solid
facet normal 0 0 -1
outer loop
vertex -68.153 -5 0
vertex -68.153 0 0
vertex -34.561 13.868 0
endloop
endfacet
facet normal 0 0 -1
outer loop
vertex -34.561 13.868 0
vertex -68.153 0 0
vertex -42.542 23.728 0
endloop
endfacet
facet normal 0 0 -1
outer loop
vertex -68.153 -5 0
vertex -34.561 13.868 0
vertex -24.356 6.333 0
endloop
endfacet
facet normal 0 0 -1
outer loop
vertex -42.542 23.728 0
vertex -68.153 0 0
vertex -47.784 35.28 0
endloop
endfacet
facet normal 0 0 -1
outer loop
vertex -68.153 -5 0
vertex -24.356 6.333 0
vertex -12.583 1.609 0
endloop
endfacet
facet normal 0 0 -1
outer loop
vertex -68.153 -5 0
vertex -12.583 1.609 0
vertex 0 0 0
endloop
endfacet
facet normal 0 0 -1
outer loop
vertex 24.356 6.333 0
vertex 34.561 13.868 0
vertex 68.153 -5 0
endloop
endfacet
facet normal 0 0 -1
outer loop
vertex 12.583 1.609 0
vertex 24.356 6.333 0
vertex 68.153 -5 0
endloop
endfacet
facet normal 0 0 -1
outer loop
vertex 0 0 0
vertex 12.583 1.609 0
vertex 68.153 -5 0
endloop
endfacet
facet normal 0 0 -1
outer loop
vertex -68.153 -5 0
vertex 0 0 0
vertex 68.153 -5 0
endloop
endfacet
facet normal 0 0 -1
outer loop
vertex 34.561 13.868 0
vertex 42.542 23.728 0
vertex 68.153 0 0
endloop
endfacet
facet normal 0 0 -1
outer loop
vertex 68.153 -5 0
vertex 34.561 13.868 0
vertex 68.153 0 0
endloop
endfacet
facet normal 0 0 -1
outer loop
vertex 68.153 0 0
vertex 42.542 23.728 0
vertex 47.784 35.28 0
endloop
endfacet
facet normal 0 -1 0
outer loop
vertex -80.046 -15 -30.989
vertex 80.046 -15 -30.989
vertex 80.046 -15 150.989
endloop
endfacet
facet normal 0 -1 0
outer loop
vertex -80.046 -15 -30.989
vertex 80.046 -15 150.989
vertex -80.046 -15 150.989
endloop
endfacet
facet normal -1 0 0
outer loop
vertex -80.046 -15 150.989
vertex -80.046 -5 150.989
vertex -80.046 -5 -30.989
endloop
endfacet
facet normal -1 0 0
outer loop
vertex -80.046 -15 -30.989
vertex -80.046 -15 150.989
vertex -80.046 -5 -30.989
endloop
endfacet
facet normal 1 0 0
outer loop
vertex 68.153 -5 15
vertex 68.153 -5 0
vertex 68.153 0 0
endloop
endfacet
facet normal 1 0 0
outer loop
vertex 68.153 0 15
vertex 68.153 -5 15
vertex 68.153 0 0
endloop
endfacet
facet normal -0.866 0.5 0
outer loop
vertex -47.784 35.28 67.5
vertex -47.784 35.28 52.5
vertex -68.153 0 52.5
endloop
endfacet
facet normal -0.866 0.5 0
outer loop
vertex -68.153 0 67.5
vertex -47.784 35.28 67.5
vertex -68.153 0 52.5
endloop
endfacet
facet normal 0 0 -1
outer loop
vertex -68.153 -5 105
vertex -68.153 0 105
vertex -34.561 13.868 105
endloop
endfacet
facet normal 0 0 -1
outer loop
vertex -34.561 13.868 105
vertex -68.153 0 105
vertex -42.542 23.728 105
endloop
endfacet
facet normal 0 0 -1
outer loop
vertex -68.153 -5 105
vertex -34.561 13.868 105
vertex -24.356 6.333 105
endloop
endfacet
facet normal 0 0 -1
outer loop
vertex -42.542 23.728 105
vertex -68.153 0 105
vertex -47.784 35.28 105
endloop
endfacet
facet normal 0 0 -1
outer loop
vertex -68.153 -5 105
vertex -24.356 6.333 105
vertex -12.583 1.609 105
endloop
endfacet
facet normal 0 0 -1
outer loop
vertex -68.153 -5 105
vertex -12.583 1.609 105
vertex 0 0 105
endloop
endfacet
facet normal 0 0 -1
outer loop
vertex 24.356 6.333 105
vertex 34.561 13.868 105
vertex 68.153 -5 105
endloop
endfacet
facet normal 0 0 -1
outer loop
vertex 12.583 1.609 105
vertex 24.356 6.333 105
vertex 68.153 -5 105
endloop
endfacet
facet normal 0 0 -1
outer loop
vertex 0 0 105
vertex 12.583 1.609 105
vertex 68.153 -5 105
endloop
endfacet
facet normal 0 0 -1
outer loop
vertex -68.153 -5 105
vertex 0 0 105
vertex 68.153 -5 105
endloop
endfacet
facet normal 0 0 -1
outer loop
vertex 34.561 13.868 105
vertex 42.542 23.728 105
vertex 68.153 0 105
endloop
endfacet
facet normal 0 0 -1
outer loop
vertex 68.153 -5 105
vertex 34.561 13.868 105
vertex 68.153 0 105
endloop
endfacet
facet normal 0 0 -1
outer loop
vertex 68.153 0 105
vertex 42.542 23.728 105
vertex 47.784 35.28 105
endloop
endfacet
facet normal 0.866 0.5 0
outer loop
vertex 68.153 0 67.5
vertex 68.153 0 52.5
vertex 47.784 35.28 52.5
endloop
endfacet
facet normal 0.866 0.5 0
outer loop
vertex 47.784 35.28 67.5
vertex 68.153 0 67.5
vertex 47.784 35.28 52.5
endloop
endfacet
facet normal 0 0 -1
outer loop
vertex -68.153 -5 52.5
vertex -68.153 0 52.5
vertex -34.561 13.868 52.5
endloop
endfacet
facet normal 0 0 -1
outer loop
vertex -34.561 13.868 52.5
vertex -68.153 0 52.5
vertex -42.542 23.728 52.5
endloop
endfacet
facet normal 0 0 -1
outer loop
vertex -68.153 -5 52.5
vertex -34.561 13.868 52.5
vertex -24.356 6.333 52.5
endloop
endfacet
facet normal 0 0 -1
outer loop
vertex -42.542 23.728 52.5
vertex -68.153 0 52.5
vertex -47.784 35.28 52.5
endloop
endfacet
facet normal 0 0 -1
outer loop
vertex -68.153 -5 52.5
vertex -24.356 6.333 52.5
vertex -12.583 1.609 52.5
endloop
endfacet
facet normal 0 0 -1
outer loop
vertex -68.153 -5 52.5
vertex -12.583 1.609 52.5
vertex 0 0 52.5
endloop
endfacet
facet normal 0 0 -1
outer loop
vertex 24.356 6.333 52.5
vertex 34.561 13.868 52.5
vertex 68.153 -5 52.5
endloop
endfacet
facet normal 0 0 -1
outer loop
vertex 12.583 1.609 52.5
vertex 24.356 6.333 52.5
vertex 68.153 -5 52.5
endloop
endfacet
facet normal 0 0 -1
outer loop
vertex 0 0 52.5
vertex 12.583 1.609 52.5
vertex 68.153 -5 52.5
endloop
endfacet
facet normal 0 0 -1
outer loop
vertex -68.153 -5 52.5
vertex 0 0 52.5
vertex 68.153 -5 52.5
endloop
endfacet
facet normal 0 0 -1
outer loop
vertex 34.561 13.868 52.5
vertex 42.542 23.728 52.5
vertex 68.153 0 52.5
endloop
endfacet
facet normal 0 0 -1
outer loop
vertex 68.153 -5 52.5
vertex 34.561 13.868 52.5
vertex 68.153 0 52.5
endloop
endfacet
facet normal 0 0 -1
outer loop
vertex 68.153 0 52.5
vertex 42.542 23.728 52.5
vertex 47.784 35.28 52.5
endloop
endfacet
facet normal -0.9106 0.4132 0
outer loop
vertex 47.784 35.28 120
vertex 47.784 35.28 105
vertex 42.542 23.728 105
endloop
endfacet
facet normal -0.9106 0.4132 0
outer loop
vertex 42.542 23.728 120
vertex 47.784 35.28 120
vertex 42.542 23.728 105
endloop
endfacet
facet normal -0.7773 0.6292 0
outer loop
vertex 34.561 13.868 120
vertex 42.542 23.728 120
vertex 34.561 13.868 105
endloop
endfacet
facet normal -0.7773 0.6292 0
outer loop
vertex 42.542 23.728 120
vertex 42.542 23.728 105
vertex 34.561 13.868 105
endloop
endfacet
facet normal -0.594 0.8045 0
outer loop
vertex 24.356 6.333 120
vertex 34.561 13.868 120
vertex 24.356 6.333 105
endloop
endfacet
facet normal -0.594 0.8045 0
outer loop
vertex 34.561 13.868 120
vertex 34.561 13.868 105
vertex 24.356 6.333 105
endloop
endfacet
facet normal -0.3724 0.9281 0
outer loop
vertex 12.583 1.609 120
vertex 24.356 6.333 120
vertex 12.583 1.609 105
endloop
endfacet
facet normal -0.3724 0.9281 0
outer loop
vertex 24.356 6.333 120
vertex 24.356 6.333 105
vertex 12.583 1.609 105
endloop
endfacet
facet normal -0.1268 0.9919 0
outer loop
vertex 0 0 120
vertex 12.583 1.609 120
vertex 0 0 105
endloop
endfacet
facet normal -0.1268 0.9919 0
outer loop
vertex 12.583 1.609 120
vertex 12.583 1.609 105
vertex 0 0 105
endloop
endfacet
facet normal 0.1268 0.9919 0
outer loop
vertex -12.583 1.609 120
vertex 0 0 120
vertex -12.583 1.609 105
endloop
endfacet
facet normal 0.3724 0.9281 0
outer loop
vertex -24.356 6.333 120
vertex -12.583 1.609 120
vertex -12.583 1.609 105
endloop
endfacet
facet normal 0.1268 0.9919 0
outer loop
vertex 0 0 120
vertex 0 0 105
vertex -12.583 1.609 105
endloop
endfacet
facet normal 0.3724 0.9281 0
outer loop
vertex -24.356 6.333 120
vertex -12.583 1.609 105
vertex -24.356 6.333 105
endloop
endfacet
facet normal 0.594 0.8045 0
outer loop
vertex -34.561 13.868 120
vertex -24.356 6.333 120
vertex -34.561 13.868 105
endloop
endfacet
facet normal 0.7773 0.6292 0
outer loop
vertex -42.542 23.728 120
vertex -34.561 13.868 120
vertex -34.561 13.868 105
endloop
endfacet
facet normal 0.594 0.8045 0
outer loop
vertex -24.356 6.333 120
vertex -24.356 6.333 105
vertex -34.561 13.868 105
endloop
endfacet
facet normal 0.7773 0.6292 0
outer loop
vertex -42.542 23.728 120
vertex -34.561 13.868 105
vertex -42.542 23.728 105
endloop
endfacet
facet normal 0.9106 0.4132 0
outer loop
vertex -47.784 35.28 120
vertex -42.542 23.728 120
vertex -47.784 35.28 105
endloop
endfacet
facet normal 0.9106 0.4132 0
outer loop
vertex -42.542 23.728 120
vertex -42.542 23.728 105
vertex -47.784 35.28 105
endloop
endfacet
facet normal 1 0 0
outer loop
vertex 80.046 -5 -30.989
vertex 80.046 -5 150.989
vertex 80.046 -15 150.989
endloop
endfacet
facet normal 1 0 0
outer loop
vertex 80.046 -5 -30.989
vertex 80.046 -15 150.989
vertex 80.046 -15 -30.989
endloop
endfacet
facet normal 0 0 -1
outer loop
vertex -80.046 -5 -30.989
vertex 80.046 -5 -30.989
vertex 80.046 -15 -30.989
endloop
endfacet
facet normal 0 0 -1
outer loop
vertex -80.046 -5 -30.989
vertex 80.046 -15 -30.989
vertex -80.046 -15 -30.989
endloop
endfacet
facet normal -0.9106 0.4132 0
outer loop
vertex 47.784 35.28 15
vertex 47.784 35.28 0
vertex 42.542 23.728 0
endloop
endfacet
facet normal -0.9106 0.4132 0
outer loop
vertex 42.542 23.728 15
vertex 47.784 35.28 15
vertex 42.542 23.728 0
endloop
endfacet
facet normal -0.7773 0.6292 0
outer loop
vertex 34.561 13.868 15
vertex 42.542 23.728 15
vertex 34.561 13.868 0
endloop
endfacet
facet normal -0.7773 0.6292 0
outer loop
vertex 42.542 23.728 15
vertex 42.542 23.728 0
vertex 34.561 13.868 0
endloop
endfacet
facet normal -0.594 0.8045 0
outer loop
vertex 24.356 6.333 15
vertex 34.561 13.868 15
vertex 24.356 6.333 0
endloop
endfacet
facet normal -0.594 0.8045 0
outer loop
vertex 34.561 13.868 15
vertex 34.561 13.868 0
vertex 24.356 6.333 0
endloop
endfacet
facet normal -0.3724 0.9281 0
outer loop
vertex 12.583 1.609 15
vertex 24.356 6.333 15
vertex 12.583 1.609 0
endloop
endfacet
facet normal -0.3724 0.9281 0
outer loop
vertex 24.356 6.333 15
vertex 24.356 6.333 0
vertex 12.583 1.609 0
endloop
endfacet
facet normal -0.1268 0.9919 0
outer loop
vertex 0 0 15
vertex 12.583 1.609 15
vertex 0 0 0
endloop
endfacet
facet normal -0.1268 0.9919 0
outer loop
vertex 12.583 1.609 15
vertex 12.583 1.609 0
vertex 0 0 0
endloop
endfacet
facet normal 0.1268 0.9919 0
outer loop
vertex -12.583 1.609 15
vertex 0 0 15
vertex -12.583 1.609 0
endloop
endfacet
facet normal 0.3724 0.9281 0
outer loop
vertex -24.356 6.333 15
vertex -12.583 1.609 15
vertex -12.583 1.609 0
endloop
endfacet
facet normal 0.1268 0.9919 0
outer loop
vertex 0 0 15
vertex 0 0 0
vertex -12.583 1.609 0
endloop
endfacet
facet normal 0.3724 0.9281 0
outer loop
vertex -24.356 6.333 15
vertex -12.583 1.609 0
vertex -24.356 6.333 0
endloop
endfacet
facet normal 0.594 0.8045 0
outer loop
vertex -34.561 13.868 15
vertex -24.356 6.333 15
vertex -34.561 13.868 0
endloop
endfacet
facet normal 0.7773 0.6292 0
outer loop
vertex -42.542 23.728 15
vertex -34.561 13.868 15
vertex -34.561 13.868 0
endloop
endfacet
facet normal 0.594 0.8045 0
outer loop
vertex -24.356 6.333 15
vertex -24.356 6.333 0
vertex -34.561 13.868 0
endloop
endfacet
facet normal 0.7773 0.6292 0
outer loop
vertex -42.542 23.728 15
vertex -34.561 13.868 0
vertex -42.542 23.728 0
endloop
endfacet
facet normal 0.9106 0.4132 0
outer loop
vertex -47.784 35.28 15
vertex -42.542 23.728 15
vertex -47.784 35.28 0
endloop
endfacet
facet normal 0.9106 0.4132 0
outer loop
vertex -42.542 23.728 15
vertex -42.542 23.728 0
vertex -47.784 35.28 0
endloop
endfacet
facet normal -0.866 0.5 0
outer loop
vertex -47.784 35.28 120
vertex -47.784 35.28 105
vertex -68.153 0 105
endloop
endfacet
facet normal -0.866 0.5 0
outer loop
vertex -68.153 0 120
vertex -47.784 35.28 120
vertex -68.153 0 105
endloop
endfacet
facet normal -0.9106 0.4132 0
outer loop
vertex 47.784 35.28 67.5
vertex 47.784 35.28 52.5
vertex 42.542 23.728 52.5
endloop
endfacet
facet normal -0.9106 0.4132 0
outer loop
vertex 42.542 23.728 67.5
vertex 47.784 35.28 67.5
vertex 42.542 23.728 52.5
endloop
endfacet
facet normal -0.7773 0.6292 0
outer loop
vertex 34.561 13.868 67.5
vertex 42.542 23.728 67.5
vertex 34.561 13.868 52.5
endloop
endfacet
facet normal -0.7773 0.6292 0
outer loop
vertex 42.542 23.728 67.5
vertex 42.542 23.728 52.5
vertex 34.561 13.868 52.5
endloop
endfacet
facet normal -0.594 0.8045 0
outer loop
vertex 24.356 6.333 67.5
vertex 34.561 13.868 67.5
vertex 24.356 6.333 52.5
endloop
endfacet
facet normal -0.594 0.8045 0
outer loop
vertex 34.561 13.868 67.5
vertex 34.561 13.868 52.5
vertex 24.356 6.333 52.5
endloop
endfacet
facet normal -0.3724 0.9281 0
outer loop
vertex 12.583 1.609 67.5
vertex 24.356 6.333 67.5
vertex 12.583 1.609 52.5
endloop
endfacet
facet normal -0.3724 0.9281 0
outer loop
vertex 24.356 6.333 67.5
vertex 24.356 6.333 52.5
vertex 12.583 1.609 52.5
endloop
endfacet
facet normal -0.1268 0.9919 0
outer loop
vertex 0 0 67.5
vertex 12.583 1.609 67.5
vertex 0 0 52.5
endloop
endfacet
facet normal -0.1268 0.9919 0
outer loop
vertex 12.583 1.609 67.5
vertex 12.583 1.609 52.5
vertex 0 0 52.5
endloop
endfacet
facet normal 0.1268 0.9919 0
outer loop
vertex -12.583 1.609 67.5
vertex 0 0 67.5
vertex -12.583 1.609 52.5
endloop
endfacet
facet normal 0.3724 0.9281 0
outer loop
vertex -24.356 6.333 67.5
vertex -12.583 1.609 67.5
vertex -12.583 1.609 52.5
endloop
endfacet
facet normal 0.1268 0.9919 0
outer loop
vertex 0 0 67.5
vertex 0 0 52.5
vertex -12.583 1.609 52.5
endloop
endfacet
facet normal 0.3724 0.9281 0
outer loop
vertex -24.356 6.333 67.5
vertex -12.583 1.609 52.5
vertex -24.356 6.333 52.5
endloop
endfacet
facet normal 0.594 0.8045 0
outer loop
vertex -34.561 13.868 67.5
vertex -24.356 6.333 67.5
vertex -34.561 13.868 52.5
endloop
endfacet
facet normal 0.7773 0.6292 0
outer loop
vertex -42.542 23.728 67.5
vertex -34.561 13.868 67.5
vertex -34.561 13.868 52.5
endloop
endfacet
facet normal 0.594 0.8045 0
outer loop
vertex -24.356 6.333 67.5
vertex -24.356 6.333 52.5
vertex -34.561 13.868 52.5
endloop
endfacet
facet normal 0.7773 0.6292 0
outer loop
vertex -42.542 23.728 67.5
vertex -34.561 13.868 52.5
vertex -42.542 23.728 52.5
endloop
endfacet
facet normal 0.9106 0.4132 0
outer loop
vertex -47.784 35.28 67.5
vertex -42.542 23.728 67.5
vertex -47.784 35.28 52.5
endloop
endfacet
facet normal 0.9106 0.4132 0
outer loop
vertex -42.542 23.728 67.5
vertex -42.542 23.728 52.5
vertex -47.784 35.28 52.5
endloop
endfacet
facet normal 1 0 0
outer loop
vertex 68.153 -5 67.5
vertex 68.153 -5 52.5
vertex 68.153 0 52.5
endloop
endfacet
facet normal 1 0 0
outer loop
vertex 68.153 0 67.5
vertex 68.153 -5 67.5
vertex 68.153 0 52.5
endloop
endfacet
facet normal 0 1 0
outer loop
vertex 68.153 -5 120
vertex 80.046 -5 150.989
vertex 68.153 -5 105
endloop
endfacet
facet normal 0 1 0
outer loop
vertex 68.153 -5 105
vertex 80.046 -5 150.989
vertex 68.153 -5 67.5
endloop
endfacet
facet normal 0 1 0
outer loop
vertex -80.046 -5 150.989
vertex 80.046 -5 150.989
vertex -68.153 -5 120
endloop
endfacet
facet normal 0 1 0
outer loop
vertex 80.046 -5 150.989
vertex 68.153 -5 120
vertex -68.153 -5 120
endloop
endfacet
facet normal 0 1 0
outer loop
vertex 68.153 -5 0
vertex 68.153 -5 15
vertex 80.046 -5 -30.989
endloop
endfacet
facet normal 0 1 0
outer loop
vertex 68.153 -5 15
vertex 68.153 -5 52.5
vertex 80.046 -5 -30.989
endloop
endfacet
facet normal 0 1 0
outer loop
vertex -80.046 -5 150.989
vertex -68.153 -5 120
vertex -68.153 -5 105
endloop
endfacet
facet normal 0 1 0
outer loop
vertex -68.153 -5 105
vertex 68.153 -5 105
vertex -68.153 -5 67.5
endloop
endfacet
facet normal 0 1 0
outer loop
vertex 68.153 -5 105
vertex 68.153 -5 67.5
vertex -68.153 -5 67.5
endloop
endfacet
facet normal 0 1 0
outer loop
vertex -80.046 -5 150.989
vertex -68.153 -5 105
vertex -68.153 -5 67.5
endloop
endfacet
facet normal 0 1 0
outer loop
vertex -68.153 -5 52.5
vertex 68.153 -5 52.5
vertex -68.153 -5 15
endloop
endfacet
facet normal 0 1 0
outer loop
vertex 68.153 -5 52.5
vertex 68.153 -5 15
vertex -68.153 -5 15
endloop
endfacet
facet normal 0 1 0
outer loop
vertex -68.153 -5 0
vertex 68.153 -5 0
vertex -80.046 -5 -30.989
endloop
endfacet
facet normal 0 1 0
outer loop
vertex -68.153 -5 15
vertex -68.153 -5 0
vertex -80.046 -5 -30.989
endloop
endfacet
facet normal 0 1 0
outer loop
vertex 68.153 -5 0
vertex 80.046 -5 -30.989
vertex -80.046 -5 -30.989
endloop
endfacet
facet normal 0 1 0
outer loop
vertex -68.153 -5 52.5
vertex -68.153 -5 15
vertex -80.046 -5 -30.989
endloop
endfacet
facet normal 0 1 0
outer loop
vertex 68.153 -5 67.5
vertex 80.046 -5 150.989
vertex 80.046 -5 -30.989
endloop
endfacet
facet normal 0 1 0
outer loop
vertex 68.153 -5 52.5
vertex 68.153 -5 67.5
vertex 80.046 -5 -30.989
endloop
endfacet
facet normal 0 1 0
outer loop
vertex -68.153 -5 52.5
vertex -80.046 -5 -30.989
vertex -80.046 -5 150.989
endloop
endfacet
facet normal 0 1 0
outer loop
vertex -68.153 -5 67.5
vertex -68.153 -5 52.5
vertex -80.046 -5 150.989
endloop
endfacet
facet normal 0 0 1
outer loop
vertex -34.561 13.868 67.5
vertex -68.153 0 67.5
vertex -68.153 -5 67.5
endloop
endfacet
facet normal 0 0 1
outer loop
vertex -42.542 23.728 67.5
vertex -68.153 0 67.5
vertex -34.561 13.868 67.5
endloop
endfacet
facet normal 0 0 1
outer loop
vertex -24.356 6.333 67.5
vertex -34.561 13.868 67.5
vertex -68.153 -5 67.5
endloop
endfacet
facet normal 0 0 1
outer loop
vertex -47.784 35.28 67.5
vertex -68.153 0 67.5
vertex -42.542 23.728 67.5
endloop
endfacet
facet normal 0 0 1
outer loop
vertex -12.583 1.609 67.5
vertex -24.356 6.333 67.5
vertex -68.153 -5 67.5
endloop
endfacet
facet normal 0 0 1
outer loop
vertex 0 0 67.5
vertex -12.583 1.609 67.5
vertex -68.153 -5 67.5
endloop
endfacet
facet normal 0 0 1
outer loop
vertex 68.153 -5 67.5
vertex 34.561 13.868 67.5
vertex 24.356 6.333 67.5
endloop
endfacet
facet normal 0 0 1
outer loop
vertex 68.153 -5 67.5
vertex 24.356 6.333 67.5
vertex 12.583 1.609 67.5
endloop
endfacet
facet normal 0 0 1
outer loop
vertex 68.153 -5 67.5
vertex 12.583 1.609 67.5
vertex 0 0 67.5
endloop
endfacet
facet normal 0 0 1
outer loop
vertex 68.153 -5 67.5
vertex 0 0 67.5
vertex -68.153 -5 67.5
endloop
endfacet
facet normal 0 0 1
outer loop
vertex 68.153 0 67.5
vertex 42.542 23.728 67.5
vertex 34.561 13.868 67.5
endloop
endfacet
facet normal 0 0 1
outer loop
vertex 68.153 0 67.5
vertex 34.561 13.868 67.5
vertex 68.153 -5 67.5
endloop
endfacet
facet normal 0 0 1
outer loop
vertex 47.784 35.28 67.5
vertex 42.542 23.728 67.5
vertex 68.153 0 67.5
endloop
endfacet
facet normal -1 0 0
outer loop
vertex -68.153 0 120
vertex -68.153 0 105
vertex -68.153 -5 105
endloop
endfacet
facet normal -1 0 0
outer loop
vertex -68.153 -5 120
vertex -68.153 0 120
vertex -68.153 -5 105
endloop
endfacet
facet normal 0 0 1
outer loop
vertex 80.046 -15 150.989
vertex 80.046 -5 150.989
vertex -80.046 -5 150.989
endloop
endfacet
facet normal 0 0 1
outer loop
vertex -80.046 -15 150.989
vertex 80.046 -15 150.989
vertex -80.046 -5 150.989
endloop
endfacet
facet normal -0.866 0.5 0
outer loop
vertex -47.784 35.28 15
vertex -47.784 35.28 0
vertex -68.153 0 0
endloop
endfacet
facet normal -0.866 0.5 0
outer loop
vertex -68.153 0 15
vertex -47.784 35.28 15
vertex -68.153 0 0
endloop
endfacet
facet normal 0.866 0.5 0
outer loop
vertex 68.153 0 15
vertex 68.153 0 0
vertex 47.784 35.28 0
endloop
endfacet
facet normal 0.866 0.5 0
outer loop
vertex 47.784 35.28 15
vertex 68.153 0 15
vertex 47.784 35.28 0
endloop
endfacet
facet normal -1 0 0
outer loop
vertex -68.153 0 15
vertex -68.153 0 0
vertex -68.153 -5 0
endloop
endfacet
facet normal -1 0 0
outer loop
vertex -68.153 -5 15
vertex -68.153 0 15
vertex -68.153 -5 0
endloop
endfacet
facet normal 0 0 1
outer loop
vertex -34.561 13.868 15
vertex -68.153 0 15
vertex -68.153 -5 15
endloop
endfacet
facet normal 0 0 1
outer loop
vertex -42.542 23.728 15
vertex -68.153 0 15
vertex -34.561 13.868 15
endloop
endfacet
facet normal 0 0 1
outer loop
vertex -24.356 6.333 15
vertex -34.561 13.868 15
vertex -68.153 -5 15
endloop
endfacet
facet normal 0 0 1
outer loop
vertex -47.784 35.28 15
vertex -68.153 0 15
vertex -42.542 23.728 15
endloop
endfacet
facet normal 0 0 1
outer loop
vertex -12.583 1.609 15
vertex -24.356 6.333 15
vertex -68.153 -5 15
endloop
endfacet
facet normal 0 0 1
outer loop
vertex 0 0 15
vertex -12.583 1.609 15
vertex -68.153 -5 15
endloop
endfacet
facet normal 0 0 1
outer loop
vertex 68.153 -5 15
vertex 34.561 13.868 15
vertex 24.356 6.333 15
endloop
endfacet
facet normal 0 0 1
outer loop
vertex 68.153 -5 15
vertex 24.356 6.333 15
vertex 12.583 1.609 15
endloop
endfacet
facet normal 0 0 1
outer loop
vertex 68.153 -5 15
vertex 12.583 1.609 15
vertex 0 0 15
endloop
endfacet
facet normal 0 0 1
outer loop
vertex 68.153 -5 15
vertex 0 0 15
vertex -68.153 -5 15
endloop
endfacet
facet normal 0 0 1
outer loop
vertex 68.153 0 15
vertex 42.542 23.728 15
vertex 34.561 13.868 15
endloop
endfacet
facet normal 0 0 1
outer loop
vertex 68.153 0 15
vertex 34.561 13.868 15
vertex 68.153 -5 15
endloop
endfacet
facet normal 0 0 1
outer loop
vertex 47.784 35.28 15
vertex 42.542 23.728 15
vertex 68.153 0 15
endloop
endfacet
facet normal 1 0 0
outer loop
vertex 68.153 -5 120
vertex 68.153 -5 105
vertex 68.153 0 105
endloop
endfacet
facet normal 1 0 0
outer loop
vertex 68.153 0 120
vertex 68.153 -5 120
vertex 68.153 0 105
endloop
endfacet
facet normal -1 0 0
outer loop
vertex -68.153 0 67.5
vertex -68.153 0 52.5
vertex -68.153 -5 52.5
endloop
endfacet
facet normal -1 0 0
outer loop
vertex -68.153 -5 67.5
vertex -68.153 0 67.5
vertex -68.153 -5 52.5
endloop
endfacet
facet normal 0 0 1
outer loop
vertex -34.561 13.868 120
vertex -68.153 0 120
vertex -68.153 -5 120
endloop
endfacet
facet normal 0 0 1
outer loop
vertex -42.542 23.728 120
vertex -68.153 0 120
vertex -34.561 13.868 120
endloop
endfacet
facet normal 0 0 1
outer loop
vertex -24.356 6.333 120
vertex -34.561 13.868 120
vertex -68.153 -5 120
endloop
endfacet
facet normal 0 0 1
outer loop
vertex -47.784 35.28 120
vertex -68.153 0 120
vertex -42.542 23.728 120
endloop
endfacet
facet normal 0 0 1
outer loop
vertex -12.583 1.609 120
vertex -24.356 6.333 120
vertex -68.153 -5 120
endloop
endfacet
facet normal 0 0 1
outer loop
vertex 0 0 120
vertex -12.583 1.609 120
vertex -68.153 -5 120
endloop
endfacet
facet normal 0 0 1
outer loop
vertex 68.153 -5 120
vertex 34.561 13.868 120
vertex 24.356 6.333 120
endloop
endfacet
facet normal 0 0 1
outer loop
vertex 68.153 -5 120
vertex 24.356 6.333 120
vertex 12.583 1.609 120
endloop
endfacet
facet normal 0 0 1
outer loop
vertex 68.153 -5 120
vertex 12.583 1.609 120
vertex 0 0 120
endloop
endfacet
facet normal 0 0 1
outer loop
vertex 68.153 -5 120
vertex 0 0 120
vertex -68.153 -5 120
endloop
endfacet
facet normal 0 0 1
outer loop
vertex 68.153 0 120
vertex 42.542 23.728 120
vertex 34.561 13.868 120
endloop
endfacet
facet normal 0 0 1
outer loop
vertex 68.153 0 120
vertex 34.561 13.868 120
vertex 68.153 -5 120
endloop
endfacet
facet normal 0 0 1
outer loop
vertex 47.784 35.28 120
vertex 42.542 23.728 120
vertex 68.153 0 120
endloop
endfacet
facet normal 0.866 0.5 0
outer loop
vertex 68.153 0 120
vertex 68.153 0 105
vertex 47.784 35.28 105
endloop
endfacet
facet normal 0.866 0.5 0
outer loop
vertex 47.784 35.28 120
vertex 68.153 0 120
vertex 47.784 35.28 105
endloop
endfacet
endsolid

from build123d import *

# Parameters (mm, degrees)
EXTRUDE_1_DEPTH        = 15
PATTERN_LINEAR_1_COUNT = 3
PATTERN_LINEAR_1_PITCH = 52.5
SKETCH_2_W             = 160.09172752
SKETCH_2_H             = 181.978003312
EXTRUDE_2_DEPTH        = 10


with BuildPart() as part:
    # 草图1 → 凸台-拉伸1 (new body)
    with BuildSketch(Plane.XY):
        with BuildLine():
            Line((-47.784051252, 35.279794638), (-68.152850184, 0))
            Line((-68.152850184, 0), (-68.152850184, -5))
            Line((-68.152850184, -5), (68.152850184, -5))
            Line((68.152850184, -5), (68.152850184, 0))
            Line((68.152850184, 0), (47.784051252, 35.279794638))
            ThreePointArc((47.784051252, 35.279794638), (0, 0), (-47.784051252, 35.279794638))
        make_face()
    extrude(amount=EXTRUDE_1_DEPTH)


with BuildPart() as pattern_linear_1_1:
    # 阵列(线性)1: pattern copy
    add(part.part.moved(Location(Vector(0, 0, 1) * (1 * PATTERN_LINEAR_1_PITCH))))


with BuildPart() as pattern_linear_1_2:
    # 阵列(线性)1: pattern copy
    add(part.part.moved(Location(Vector(0, 0, 1) * (2 * PATTERN_LINEAR_1_PITCH))))


with BuildPart() as part_1:
    add(part.part)

    add(pattern_linear_1_1.part)  # 凸台-拉伸2 merges 阵列(线性)1_1

    add(pattern_linear_1_2.part)  # 凸台-拉伸2 merges 阵列(线性)1_2
    # 草图2 → 凸台-拉伸2 (add)
    with BuildSketch(Plane(origin=(0, -5, 0), x_dir=(-1, 0, 0), z_dir=(0, -1, 0))):
        with Locations((0, -60)):
            Rectangle(SKETCH_2_W, SKETCH_2_H)
    extrude(amount=EXTRUDE_2_DEPTH)


solid = part_1.part
